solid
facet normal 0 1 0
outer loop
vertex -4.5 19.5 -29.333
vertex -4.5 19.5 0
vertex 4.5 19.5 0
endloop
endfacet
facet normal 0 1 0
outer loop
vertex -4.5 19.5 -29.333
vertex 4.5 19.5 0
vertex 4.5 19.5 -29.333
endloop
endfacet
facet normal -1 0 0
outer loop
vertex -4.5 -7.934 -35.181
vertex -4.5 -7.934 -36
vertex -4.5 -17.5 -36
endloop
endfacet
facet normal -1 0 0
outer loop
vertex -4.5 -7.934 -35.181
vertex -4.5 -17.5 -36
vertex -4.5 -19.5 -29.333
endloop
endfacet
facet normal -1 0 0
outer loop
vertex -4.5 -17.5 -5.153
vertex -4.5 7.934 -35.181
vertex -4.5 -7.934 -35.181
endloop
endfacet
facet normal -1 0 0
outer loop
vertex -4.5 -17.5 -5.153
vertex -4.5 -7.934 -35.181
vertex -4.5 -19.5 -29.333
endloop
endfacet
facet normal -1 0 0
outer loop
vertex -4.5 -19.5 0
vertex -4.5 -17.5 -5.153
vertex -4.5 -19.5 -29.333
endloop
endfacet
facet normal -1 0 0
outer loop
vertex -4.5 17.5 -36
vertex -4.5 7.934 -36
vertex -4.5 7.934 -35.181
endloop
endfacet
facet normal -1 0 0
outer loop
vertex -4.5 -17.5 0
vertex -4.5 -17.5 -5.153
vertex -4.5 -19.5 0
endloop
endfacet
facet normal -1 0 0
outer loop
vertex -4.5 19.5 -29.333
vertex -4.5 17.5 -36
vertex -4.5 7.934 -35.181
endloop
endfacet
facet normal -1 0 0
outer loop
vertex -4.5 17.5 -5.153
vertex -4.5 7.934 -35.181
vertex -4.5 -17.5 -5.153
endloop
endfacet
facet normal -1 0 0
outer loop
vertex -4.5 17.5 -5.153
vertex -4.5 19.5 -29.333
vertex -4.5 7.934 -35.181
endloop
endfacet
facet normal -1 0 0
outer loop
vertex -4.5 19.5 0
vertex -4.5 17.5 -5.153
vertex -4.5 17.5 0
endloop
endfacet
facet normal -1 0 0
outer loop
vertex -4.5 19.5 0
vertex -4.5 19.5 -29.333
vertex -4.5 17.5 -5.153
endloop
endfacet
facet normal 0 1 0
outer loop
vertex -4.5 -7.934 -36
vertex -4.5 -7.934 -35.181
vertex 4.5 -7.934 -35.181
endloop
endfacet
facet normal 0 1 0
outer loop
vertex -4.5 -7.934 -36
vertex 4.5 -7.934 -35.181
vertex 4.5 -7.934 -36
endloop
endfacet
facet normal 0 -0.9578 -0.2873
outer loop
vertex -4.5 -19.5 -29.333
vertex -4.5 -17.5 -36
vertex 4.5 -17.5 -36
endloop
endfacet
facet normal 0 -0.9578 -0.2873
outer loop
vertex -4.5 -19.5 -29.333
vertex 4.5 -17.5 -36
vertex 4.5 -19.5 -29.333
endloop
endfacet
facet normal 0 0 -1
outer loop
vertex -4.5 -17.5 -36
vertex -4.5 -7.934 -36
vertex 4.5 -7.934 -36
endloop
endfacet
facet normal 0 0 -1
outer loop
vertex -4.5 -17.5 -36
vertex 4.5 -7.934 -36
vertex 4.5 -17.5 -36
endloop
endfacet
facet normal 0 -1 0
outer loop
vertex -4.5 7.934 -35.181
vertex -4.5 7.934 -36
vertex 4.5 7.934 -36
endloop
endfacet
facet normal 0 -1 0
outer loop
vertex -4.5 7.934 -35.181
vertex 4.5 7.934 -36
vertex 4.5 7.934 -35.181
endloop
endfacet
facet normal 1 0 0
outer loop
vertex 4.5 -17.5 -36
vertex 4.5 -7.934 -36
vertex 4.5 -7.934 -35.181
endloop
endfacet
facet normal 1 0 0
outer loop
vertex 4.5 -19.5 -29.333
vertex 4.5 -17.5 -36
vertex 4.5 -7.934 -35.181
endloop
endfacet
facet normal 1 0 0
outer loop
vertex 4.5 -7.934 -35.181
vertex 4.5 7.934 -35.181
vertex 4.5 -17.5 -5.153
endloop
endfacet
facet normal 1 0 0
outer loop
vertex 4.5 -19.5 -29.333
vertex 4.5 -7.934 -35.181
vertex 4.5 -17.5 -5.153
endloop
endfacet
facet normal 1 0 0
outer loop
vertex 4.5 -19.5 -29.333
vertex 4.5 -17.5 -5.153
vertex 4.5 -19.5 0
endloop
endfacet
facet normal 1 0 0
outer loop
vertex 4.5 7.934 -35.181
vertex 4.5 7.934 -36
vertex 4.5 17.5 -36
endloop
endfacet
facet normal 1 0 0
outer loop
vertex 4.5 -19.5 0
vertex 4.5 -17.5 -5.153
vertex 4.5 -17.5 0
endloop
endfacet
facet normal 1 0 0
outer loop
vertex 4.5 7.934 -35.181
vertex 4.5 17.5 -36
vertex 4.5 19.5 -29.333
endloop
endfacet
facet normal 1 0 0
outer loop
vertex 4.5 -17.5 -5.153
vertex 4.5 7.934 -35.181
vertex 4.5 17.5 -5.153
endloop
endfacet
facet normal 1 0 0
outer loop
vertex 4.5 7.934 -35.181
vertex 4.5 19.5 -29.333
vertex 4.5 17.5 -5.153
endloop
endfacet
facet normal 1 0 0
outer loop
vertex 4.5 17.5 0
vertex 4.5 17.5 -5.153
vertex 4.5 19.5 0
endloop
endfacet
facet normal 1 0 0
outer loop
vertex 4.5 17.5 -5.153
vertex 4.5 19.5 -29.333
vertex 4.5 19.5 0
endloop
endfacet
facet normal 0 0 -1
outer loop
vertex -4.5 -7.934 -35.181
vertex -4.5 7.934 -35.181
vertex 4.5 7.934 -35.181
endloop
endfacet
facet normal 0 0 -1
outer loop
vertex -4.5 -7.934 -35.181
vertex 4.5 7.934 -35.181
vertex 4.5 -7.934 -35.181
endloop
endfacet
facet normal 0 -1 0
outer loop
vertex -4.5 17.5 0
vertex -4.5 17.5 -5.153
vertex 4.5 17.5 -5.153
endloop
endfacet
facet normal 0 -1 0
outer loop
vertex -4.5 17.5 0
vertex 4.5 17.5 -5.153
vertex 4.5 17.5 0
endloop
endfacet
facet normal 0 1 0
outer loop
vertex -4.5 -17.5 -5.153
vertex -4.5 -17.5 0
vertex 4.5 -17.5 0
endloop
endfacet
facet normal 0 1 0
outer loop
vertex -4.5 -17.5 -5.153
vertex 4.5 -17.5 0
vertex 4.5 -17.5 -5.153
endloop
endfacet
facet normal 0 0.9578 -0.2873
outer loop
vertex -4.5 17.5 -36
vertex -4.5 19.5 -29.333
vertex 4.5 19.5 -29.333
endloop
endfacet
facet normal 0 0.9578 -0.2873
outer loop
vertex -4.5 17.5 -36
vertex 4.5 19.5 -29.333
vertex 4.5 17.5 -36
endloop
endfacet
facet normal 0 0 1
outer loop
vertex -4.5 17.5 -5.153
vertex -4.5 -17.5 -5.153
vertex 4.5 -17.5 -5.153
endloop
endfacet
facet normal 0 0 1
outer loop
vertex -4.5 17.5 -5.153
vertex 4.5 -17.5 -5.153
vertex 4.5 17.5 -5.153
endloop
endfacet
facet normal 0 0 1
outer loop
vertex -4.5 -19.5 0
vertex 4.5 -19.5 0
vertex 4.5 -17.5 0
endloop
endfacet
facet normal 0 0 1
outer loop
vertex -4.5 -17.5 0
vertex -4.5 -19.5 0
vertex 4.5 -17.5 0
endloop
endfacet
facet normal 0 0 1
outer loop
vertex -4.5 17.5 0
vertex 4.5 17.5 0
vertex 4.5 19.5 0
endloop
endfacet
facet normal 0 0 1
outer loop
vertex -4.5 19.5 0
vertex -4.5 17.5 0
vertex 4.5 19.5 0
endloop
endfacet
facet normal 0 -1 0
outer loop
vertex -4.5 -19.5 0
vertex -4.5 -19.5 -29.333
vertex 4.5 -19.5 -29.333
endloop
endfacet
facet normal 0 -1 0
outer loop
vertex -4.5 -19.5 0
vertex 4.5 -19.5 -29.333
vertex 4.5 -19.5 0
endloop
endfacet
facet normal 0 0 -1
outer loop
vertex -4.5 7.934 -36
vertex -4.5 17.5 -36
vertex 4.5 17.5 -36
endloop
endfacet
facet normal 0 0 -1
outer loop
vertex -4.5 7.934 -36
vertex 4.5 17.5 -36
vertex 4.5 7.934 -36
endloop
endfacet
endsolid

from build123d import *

# Parameters (mm, degrees)
EXTRUDE_1_DEPTH      = 4.5
EXTRUDE_1_DEPTH_BACK = 4.5


with BuildPart() as part:
    # 草图1 → 凸台-拉伸1 (new, two sides: drawn at the far end of the back side and taken through both)
    with BuildSketch(Plane(origin=(0, 0, 0), x_dir=(0, 0, -1), z_dir=(1, 0, 0)).offset(-EXTRUDE_1_DEPTH_BACK)):
        Polygon((0, 17.5), (0, 19.5), (29.3330418, 19.5), (36, 17.5), (36, 7.934061775), (35.180915007, 7.934061775), (35.180915007, -7.934061775), (36, -7.934061775), (36, -17.5), (29.3330418, -19.5), (0, -19.5), (0, -17.5), (5.153343524, -17.5), (5.153343524, 17.5), align=None)
    extrude(amount=EXTRUDE_1_DEPTH + EXTRUDE_1_DEPTH_BACK)


solid = part.part
